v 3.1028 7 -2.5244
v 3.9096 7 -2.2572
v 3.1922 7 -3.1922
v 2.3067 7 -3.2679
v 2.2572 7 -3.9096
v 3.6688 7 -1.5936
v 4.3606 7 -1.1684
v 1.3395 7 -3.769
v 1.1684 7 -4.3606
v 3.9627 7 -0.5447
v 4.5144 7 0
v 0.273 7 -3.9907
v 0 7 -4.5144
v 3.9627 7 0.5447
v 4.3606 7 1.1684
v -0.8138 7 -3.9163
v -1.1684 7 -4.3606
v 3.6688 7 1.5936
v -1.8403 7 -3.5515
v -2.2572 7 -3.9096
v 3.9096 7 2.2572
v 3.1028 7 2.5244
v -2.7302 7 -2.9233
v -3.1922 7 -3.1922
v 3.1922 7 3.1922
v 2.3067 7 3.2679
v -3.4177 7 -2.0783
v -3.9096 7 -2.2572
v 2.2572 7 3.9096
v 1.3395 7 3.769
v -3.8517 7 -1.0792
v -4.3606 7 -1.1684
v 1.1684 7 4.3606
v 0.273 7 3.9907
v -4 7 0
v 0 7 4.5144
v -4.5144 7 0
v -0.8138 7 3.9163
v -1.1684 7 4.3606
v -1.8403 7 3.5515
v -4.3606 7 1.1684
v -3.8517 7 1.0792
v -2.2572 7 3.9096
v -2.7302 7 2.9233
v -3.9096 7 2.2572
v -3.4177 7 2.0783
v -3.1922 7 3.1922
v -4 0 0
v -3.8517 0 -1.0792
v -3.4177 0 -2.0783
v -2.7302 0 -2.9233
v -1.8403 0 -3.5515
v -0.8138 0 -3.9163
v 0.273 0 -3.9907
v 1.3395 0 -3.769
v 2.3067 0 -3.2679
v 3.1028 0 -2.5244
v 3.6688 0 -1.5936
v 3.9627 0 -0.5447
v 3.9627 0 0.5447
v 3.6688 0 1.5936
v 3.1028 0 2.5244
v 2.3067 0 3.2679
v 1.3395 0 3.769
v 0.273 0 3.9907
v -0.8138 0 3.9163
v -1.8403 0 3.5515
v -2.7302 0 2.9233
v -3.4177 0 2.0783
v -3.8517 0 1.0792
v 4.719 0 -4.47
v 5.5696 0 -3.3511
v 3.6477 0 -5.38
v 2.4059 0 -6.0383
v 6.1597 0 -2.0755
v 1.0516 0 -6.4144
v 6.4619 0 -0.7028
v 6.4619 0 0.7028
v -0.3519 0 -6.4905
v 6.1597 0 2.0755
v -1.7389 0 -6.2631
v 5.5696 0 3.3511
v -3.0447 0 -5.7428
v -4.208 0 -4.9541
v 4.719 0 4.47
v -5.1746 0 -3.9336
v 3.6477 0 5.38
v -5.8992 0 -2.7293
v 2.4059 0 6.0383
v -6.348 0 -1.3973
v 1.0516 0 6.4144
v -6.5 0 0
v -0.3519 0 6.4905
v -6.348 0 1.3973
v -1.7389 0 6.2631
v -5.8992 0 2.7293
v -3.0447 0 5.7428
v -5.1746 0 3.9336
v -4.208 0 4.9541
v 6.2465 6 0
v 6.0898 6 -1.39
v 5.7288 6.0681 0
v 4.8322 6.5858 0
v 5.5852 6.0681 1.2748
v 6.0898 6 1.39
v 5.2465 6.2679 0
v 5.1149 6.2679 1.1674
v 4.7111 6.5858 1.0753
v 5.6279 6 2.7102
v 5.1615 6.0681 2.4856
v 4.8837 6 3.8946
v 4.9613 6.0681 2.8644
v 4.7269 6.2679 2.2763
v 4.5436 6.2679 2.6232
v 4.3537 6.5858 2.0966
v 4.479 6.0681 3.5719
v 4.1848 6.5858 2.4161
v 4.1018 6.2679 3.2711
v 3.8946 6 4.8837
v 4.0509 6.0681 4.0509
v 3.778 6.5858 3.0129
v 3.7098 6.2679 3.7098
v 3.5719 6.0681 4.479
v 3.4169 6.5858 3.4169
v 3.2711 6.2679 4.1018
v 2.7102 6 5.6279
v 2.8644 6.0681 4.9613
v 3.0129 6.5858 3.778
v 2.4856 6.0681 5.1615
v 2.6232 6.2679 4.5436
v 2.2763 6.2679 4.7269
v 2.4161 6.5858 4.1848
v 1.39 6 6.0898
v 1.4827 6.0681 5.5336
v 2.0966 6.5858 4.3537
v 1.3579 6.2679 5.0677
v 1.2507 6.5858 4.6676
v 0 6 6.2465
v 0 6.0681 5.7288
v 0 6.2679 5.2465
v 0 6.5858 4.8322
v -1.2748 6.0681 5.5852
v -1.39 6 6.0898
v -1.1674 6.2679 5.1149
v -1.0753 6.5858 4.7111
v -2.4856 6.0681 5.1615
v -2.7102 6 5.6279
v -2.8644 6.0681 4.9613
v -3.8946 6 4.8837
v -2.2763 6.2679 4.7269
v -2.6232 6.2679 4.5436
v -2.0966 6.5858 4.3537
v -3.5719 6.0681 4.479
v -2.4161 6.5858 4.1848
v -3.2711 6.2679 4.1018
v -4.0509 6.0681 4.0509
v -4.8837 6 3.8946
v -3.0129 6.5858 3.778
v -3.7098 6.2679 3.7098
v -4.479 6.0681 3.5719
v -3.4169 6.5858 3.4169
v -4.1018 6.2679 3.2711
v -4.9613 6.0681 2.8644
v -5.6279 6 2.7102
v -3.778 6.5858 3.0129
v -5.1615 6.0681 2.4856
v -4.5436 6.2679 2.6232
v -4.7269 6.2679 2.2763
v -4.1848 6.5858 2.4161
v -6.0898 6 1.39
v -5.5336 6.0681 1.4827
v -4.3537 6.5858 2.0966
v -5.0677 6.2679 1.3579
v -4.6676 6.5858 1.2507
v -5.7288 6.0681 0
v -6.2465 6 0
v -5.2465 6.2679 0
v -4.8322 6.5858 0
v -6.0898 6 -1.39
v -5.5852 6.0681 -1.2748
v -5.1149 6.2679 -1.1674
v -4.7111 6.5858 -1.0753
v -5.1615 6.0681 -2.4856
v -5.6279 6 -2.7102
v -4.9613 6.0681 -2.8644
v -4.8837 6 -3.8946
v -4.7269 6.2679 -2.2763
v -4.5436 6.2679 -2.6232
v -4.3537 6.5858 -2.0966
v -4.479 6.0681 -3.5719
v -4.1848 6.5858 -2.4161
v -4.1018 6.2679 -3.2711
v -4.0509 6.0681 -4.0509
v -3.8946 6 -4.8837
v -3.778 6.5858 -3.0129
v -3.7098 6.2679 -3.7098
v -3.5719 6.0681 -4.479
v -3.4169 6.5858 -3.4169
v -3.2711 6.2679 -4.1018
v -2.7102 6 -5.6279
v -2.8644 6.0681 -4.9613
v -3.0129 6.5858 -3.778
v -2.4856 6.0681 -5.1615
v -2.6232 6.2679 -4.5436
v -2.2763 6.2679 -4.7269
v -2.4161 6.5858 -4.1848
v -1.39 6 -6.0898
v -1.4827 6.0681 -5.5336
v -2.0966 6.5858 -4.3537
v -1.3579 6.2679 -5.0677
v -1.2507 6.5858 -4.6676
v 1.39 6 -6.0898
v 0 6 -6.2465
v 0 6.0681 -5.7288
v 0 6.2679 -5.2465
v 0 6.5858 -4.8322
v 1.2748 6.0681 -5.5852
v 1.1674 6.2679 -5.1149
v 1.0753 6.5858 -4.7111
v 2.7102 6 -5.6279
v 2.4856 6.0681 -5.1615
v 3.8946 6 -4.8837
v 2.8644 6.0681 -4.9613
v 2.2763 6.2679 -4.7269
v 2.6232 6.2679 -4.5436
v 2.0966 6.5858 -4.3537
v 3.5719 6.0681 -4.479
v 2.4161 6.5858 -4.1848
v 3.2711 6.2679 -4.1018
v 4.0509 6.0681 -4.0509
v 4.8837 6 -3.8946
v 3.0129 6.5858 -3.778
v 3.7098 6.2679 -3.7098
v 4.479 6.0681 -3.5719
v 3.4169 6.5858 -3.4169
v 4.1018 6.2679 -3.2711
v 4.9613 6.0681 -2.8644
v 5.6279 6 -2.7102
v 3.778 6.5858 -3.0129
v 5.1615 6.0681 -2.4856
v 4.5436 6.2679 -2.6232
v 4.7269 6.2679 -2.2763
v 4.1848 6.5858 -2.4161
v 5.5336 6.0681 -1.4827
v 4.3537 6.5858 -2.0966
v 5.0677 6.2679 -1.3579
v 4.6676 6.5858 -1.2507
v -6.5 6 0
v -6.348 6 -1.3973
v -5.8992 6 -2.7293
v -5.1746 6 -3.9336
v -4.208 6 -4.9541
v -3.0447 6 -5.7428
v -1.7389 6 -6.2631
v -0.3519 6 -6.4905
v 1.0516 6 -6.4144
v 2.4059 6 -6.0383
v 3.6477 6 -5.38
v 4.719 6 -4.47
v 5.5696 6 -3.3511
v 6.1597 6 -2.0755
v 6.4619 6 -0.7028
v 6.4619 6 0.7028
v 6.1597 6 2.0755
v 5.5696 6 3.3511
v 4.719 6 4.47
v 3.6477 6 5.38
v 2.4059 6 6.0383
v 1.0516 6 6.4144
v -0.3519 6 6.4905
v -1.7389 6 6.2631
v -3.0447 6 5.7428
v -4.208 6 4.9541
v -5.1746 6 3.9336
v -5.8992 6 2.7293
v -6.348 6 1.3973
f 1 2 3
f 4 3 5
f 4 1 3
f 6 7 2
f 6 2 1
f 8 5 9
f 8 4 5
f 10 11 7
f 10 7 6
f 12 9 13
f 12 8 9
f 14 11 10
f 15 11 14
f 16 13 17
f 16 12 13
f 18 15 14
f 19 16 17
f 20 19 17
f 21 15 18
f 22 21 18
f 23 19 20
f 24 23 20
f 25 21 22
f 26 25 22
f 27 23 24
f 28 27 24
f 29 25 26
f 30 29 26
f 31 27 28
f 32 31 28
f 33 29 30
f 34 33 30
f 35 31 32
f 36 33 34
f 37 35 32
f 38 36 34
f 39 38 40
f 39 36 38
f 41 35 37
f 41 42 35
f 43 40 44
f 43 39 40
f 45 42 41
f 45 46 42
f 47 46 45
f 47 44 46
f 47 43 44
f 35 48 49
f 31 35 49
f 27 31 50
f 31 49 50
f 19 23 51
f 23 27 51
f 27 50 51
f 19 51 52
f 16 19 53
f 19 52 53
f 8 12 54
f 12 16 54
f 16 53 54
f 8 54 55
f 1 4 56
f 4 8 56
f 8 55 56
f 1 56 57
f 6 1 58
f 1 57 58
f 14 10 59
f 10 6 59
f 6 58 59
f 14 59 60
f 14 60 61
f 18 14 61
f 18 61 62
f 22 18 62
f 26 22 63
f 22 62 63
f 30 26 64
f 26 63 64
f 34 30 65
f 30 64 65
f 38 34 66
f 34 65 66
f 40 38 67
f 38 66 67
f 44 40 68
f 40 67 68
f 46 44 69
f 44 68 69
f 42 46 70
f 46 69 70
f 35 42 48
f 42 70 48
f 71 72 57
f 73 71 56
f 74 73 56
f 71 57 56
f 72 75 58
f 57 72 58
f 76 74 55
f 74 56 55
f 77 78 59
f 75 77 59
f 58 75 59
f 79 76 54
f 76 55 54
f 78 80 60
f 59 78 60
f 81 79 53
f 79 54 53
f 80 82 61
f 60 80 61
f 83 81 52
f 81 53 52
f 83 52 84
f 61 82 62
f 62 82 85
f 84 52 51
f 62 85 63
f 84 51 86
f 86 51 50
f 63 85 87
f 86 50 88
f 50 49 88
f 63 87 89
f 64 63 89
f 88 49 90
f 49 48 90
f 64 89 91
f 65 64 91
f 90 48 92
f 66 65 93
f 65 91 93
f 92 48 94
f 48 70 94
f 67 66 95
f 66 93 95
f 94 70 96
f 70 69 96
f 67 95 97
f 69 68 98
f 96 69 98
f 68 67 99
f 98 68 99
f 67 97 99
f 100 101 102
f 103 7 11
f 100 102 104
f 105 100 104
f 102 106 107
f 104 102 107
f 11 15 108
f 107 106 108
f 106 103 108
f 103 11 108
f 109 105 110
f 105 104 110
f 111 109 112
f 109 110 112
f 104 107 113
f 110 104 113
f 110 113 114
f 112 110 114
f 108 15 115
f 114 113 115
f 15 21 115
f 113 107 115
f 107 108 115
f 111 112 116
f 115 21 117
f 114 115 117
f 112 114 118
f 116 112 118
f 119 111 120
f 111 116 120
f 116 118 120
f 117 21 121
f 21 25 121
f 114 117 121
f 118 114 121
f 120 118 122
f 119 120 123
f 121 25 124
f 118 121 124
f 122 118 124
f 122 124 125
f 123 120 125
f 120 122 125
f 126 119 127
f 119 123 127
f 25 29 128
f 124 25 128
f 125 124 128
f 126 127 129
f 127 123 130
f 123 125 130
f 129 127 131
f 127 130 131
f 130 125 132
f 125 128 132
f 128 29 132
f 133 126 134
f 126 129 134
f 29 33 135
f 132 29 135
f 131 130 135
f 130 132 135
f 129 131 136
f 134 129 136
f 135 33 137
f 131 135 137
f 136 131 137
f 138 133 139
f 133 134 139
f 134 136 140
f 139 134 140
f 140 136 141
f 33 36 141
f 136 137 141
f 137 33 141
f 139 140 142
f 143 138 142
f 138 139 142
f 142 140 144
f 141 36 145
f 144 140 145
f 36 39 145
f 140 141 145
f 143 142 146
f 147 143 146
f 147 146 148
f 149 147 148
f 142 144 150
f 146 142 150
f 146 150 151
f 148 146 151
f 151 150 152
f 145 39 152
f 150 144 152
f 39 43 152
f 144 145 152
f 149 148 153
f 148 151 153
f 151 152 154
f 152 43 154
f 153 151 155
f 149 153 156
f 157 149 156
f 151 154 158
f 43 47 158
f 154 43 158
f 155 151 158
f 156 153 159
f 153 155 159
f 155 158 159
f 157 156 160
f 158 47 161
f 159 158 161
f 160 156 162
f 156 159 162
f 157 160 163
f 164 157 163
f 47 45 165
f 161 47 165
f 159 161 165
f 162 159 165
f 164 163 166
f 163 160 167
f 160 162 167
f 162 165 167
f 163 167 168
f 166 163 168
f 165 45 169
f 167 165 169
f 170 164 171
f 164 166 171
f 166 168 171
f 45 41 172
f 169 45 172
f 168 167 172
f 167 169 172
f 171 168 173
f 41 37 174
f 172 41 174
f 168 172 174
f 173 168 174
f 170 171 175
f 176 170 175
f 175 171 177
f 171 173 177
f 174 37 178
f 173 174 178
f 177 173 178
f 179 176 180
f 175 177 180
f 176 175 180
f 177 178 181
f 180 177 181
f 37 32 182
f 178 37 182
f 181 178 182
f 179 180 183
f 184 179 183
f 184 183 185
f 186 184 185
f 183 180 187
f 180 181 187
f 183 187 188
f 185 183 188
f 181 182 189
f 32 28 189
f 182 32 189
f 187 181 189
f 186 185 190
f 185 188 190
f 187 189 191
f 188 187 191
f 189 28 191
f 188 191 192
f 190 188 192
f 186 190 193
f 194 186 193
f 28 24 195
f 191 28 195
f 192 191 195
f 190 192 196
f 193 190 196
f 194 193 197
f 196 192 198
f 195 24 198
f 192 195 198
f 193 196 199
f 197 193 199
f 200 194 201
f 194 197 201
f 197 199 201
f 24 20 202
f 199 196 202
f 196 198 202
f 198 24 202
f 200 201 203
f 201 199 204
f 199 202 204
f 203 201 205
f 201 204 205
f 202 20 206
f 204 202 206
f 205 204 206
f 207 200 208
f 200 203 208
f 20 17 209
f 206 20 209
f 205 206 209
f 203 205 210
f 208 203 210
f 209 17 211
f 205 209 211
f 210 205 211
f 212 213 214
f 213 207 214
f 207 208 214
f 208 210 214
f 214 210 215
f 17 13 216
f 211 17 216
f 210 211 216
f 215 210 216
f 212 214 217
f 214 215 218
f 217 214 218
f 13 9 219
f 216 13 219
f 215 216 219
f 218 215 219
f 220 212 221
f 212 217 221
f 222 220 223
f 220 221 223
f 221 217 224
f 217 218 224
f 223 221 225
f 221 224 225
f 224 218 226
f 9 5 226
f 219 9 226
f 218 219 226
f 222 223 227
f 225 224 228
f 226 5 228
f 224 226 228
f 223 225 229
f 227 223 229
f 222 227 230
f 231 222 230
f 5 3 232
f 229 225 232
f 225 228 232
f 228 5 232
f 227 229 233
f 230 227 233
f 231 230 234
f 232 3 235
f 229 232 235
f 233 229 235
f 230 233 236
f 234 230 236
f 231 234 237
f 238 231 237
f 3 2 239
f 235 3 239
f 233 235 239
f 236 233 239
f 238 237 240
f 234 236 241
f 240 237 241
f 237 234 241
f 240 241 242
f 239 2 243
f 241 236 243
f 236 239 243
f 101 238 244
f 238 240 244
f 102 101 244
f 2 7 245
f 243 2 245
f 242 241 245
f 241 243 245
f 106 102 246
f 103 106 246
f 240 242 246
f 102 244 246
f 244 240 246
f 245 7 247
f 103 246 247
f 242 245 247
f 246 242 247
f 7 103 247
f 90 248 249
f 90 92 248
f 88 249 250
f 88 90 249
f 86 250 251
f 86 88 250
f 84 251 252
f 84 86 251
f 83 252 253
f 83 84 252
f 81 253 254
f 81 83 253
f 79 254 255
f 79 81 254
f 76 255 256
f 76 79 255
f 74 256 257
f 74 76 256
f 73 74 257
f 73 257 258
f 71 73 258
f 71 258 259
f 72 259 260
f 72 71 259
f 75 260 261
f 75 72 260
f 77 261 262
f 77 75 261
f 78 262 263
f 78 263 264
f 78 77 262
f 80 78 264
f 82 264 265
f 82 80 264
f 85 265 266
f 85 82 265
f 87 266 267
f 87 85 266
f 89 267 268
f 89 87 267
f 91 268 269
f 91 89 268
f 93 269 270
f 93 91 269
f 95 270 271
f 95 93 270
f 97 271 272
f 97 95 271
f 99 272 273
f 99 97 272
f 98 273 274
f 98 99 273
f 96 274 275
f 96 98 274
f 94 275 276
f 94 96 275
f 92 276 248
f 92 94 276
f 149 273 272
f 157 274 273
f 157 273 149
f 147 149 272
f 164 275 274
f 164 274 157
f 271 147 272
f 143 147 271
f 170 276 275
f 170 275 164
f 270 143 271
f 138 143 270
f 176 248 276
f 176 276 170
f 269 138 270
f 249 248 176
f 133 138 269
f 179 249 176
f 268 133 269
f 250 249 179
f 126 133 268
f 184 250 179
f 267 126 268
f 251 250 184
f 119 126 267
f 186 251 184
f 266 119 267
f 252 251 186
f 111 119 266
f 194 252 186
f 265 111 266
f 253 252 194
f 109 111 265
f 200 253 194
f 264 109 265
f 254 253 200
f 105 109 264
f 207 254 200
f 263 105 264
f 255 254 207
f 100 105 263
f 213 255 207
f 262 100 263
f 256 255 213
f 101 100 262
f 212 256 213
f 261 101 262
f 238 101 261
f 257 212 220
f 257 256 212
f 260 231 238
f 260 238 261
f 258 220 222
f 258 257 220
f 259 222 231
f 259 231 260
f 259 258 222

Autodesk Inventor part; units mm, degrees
ref_plane "YZ Plane" through (0, 0, 0) normal (1, 0, 0) x (0, 1, 0)
ref_plane "XZ Plane" through (0, 0, 0) normal (0, 1, 0) x (-1, 0, 0)
ref_plane "XY Plane" through (0, 0, 0) normal (0, 0, 1) x (1, 0, 0)
sketch "Sketch1" plane through (0, 0, 0) normal (0, 1, 0) x (-1, 0, 0)
  circle A0 centre (0, 0) radius 6.5
  circle A1 centre (0, 0) radius 4
  dimension "d0" = 13
  dimension "d1" = 8
extrude "Extrusion1" add sketch "Sketch1" along normal blind 7
sketch "Sketch2" plane through (0, 7, 0) normal (0, 1, 0) x (1, 0, 0)
  circle A0 centre (0, 0) radius 4.5144
  circle A1 centre (0, 0) radius 7.9884
extrude "Extrusion2" cut sketch "Sketch2" against normal blind 1
fillet "Fillet1" radius 2 1 edges at (-4.5144, 6, 0)
properties part number "ulozak prednji" material "Acetal Resin, Black"
